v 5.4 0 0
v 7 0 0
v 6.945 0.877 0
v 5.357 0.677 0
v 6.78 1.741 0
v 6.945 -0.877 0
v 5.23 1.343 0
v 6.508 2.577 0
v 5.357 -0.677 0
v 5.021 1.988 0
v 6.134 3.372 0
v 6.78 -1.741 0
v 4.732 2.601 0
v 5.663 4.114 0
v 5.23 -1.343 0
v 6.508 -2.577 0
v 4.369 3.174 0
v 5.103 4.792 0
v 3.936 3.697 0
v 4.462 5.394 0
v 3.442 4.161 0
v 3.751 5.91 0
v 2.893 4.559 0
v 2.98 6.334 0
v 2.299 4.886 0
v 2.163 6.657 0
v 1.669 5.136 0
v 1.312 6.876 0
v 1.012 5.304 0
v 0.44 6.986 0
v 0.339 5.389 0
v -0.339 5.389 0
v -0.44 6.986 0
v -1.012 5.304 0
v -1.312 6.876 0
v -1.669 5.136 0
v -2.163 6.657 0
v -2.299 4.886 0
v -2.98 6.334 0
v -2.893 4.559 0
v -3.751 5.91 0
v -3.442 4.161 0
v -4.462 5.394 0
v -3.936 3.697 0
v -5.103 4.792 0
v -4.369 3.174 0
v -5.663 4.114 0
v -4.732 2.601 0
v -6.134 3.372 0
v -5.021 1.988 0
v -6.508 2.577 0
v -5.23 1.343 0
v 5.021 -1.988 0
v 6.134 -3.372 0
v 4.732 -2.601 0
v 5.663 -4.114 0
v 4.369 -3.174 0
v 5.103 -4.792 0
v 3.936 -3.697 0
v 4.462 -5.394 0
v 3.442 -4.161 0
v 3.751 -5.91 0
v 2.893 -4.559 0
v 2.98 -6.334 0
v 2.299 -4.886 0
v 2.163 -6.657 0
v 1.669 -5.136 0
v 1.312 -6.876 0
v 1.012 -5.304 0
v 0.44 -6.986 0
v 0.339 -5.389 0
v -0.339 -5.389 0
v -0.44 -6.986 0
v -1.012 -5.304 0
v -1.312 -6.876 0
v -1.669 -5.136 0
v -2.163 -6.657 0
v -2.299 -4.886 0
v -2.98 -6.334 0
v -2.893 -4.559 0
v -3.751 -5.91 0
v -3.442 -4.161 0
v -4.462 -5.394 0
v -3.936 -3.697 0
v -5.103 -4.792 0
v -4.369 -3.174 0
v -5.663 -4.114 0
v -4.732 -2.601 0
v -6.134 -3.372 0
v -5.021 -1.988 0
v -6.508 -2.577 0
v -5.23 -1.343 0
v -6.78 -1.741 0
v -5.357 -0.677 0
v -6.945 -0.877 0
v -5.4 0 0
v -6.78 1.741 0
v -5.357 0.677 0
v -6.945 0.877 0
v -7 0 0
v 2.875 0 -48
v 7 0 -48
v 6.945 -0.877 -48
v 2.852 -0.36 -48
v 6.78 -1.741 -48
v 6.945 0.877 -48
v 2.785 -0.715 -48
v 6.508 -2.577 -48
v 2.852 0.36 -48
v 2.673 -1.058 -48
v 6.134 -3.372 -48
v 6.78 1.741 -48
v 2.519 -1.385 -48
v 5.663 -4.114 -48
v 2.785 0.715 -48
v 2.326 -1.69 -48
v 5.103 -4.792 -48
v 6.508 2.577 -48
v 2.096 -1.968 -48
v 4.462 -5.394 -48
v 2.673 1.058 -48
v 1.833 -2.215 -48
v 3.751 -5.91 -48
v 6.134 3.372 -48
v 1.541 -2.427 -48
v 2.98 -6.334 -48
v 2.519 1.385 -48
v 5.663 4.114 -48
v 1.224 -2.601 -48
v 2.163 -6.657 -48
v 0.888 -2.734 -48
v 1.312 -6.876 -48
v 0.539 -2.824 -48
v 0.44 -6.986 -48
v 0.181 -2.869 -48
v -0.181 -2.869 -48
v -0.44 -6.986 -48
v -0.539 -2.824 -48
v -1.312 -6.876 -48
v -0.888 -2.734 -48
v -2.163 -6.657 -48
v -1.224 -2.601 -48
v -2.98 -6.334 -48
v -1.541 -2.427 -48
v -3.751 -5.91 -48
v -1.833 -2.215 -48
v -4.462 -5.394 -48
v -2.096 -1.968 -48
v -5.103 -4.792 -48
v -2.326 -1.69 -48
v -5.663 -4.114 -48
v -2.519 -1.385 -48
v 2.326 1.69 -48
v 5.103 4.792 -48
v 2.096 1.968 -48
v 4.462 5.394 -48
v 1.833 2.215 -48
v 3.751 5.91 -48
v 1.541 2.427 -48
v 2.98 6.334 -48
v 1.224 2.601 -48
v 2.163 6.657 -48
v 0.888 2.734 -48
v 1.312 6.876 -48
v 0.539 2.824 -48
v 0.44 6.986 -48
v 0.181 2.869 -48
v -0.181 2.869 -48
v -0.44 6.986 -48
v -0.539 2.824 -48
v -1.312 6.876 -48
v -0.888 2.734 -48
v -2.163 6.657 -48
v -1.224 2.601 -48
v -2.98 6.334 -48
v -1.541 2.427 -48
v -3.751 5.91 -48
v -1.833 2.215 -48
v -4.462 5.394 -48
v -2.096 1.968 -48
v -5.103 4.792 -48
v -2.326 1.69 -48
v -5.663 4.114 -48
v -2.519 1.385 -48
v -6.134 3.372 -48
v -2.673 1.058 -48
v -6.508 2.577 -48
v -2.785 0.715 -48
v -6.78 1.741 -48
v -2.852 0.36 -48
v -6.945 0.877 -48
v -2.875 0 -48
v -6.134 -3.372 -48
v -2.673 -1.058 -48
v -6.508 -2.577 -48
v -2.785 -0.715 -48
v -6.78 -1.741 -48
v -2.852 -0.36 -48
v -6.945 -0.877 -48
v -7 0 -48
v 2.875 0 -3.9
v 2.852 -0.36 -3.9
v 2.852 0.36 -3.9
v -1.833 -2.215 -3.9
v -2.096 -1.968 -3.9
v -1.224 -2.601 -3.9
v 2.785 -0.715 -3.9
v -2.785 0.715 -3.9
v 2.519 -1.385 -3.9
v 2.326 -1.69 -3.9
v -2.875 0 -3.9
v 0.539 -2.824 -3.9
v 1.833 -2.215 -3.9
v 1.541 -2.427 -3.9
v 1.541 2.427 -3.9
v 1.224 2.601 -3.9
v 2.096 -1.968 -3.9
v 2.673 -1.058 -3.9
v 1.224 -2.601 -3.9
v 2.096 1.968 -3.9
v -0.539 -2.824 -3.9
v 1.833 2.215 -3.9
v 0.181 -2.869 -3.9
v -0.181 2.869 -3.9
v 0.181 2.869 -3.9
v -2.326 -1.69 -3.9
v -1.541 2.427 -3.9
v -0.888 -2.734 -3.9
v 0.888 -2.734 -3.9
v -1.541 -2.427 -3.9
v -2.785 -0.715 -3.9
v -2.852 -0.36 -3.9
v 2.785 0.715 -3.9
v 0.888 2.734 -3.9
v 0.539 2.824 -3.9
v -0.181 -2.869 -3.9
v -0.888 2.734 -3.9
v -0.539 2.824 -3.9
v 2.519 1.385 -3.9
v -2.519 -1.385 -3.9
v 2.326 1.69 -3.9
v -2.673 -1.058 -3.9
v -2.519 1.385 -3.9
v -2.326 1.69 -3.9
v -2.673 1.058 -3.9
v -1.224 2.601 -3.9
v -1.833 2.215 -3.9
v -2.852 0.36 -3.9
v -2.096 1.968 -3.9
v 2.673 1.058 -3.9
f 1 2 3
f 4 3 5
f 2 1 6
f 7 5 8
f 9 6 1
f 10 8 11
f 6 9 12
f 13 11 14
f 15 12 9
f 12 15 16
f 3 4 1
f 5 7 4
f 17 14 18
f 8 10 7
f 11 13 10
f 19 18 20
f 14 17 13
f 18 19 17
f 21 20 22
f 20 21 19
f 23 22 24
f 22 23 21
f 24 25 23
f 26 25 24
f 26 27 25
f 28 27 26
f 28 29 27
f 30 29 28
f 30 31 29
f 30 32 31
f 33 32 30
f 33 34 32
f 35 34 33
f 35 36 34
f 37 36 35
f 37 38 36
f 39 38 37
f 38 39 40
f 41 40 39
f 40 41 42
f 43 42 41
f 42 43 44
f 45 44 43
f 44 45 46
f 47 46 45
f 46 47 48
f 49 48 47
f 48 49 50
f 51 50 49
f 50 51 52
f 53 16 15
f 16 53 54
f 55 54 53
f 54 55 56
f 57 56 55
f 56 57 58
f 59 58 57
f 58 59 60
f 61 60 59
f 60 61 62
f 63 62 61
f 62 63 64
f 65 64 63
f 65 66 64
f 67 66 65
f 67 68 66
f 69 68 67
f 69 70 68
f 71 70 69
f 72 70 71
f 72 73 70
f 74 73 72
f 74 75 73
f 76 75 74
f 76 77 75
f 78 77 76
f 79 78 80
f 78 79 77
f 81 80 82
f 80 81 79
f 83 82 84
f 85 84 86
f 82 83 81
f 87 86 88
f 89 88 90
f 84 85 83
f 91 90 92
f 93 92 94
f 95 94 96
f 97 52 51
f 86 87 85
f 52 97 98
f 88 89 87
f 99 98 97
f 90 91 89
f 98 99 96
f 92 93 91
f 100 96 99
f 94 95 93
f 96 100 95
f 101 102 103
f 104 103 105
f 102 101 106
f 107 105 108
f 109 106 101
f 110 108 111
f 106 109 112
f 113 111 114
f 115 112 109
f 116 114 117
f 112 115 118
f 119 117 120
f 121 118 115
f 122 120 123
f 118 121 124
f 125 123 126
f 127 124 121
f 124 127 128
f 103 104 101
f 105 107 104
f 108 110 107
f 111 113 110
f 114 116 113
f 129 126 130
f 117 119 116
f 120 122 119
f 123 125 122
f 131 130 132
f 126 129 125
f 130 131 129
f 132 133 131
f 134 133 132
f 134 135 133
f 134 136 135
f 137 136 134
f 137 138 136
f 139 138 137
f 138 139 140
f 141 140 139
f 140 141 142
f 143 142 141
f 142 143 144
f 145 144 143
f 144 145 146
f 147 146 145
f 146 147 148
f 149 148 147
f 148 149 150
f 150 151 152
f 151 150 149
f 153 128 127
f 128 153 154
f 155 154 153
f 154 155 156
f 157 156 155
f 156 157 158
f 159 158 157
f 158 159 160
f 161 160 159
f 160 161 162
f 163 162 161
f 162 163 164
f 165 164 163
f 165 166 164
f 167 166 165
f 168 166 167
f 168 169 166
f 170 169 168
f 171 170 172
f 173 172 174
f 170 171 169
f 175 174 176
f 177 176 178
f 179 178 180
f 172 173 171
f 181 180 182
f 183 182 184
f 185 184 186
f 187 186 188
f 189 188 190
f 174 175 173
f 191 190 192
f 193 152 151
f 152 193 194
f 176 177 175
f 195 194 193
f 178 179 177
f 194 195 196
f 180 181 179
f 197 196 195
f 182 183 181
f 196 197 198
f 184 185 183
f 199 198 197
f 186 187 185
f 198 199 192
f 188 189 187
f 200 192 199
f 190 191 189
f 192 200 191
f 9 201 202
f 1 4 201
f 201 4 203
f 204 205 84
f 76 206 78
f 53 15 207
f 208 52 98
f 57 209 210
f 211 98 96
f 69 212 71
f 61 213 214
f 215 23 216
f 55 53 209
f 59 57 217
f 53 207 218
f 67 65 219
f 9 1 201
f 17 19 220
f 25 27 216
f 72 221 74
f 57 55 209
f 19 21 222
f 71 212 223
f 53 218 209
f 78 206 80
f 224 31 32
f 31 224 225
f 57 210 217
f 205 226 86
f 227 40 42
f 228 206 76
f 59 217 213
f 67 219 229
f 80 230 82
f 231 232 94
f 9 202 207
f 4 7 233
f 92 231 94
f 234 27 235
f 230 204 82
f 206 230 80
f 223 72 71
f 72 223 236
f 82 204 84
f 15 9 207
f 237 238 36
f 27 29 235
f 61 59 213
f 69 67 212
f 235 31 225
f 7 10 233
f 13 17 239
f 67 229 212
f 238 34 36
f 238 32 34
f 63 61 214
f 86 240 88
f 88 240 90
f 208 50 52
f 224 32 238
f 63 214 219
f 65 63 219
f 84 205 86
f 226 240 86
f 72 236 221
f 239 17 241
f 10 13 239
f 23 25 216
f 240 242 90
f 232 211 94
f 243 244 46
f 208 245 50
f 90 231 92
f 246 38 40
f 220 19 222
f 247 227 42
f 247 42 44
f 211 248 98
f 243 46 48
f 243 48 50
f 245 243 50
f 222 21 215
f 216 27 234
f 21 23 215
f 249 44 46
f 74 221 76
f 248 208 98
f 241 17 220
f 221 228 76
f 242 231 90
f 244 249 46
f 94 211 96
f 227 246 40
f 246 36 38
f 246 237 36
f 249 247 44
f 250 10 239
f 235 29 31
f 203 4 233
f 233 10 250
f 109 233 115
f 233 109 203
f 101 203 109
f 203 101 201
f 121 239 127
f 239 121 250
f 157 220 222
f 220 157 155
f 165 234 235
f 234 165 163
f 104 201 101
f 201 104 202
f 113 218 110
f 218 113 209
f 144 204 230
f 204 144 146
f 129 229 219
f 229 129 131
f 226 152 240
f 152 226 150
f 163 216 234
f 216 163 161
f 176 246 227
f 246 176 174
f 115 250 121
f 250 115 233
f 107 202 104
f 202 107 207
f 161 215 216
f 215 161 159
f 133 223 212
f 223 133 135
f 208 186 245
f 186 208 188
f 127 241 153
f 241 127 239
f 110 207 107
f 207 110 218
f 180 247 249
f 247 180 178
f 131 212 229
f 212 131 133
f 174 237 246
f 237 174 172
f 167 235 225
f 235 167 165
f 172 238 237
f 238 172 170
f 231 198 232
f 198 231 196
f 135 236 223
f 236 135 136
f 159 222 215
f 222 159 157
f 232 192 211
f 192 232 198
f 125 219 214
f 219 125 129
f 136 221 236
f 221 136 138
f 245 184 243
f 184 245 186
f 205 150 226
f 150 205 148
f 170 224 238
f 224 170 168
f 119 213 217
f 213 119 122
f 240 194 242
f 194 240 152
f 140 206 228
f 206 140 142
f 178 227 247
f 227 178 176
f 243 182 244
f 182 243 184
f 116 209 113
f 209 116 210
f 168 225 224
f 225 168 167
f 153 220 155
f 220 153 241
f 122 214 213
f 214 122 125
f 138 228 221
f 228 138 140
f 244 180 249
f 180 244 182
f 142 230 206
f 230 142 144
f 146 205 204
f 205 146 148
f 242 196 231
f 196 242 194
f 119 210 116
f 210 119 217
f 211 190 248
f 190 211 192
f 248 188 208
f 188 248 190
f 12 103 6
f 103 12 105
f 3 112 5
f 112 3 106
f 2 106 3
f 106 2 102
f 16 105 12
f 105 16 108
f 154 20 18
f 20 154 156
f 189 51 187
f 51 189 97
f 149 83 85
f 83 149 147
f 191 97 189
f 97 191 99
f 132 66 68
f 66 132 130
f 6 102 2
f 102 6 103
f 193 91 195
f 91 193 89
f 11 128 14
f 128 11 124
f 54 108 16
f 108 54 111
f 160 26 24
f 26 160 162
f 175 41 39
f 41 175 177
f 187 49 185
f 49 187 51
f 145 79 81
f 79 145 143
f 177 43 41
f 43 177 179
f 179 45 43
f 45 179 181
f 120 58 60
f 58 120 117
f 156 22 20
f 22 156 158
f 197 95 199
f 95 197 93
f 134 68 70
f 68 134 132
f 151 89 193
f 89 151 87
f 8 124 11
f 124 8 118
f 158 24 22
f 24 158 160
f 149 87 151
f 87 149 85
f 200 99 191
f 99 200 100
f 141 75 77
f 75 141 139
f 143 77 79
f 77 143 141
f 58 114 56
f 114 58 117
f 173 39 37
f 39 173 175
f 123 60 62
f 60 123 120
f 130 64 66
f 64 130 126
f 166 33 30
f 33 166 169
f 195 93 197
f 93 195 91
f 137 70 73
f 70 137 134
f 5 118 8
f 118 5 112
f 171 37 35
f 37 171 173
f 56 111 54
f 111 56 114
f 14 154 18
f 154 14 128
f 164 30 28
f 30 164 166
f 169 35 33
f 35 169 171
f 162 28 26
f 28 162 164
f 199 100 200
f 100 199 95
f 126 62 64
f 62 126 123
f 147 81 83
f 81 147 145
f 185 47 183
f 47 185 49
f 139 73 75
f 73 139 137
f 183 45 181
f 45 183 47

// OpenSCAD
$fn = 50;


difference() {
	union() {
		translate(v = [0, 0, -48.0000000000]) {
			cylinder(h = 48, r = 7.0000000000);
		}
		cylinder(h = 0, r = 10.0000000000);
	}
	union() {
		translate(v = [0, 0, 0]) {
			rotate(a = [0, 0, 0]) {
				difference() {
					union() {
						#translate(v = [0, 0, -48.0000000000]) {
							cylinder(h = 48, r = 2.6000000000);
						}
						#translate(v = [0, 0, -3.9000000000]) {
							cylinder(h = 3.9000000000, r1 = 2.8750000000, r2 = 5.4000000000);
						}
						#translate(v = [0, 0, -48.0000000000]) {
							cylinder(h = 48, r = 2.8750000000);
						}
						#translate(v = [0, 0, -48.0000000000]) {
							cylinder(h = 48, r = 2.6000000000);
						}
					}
					union();
				}
			}
		}
	}
}
